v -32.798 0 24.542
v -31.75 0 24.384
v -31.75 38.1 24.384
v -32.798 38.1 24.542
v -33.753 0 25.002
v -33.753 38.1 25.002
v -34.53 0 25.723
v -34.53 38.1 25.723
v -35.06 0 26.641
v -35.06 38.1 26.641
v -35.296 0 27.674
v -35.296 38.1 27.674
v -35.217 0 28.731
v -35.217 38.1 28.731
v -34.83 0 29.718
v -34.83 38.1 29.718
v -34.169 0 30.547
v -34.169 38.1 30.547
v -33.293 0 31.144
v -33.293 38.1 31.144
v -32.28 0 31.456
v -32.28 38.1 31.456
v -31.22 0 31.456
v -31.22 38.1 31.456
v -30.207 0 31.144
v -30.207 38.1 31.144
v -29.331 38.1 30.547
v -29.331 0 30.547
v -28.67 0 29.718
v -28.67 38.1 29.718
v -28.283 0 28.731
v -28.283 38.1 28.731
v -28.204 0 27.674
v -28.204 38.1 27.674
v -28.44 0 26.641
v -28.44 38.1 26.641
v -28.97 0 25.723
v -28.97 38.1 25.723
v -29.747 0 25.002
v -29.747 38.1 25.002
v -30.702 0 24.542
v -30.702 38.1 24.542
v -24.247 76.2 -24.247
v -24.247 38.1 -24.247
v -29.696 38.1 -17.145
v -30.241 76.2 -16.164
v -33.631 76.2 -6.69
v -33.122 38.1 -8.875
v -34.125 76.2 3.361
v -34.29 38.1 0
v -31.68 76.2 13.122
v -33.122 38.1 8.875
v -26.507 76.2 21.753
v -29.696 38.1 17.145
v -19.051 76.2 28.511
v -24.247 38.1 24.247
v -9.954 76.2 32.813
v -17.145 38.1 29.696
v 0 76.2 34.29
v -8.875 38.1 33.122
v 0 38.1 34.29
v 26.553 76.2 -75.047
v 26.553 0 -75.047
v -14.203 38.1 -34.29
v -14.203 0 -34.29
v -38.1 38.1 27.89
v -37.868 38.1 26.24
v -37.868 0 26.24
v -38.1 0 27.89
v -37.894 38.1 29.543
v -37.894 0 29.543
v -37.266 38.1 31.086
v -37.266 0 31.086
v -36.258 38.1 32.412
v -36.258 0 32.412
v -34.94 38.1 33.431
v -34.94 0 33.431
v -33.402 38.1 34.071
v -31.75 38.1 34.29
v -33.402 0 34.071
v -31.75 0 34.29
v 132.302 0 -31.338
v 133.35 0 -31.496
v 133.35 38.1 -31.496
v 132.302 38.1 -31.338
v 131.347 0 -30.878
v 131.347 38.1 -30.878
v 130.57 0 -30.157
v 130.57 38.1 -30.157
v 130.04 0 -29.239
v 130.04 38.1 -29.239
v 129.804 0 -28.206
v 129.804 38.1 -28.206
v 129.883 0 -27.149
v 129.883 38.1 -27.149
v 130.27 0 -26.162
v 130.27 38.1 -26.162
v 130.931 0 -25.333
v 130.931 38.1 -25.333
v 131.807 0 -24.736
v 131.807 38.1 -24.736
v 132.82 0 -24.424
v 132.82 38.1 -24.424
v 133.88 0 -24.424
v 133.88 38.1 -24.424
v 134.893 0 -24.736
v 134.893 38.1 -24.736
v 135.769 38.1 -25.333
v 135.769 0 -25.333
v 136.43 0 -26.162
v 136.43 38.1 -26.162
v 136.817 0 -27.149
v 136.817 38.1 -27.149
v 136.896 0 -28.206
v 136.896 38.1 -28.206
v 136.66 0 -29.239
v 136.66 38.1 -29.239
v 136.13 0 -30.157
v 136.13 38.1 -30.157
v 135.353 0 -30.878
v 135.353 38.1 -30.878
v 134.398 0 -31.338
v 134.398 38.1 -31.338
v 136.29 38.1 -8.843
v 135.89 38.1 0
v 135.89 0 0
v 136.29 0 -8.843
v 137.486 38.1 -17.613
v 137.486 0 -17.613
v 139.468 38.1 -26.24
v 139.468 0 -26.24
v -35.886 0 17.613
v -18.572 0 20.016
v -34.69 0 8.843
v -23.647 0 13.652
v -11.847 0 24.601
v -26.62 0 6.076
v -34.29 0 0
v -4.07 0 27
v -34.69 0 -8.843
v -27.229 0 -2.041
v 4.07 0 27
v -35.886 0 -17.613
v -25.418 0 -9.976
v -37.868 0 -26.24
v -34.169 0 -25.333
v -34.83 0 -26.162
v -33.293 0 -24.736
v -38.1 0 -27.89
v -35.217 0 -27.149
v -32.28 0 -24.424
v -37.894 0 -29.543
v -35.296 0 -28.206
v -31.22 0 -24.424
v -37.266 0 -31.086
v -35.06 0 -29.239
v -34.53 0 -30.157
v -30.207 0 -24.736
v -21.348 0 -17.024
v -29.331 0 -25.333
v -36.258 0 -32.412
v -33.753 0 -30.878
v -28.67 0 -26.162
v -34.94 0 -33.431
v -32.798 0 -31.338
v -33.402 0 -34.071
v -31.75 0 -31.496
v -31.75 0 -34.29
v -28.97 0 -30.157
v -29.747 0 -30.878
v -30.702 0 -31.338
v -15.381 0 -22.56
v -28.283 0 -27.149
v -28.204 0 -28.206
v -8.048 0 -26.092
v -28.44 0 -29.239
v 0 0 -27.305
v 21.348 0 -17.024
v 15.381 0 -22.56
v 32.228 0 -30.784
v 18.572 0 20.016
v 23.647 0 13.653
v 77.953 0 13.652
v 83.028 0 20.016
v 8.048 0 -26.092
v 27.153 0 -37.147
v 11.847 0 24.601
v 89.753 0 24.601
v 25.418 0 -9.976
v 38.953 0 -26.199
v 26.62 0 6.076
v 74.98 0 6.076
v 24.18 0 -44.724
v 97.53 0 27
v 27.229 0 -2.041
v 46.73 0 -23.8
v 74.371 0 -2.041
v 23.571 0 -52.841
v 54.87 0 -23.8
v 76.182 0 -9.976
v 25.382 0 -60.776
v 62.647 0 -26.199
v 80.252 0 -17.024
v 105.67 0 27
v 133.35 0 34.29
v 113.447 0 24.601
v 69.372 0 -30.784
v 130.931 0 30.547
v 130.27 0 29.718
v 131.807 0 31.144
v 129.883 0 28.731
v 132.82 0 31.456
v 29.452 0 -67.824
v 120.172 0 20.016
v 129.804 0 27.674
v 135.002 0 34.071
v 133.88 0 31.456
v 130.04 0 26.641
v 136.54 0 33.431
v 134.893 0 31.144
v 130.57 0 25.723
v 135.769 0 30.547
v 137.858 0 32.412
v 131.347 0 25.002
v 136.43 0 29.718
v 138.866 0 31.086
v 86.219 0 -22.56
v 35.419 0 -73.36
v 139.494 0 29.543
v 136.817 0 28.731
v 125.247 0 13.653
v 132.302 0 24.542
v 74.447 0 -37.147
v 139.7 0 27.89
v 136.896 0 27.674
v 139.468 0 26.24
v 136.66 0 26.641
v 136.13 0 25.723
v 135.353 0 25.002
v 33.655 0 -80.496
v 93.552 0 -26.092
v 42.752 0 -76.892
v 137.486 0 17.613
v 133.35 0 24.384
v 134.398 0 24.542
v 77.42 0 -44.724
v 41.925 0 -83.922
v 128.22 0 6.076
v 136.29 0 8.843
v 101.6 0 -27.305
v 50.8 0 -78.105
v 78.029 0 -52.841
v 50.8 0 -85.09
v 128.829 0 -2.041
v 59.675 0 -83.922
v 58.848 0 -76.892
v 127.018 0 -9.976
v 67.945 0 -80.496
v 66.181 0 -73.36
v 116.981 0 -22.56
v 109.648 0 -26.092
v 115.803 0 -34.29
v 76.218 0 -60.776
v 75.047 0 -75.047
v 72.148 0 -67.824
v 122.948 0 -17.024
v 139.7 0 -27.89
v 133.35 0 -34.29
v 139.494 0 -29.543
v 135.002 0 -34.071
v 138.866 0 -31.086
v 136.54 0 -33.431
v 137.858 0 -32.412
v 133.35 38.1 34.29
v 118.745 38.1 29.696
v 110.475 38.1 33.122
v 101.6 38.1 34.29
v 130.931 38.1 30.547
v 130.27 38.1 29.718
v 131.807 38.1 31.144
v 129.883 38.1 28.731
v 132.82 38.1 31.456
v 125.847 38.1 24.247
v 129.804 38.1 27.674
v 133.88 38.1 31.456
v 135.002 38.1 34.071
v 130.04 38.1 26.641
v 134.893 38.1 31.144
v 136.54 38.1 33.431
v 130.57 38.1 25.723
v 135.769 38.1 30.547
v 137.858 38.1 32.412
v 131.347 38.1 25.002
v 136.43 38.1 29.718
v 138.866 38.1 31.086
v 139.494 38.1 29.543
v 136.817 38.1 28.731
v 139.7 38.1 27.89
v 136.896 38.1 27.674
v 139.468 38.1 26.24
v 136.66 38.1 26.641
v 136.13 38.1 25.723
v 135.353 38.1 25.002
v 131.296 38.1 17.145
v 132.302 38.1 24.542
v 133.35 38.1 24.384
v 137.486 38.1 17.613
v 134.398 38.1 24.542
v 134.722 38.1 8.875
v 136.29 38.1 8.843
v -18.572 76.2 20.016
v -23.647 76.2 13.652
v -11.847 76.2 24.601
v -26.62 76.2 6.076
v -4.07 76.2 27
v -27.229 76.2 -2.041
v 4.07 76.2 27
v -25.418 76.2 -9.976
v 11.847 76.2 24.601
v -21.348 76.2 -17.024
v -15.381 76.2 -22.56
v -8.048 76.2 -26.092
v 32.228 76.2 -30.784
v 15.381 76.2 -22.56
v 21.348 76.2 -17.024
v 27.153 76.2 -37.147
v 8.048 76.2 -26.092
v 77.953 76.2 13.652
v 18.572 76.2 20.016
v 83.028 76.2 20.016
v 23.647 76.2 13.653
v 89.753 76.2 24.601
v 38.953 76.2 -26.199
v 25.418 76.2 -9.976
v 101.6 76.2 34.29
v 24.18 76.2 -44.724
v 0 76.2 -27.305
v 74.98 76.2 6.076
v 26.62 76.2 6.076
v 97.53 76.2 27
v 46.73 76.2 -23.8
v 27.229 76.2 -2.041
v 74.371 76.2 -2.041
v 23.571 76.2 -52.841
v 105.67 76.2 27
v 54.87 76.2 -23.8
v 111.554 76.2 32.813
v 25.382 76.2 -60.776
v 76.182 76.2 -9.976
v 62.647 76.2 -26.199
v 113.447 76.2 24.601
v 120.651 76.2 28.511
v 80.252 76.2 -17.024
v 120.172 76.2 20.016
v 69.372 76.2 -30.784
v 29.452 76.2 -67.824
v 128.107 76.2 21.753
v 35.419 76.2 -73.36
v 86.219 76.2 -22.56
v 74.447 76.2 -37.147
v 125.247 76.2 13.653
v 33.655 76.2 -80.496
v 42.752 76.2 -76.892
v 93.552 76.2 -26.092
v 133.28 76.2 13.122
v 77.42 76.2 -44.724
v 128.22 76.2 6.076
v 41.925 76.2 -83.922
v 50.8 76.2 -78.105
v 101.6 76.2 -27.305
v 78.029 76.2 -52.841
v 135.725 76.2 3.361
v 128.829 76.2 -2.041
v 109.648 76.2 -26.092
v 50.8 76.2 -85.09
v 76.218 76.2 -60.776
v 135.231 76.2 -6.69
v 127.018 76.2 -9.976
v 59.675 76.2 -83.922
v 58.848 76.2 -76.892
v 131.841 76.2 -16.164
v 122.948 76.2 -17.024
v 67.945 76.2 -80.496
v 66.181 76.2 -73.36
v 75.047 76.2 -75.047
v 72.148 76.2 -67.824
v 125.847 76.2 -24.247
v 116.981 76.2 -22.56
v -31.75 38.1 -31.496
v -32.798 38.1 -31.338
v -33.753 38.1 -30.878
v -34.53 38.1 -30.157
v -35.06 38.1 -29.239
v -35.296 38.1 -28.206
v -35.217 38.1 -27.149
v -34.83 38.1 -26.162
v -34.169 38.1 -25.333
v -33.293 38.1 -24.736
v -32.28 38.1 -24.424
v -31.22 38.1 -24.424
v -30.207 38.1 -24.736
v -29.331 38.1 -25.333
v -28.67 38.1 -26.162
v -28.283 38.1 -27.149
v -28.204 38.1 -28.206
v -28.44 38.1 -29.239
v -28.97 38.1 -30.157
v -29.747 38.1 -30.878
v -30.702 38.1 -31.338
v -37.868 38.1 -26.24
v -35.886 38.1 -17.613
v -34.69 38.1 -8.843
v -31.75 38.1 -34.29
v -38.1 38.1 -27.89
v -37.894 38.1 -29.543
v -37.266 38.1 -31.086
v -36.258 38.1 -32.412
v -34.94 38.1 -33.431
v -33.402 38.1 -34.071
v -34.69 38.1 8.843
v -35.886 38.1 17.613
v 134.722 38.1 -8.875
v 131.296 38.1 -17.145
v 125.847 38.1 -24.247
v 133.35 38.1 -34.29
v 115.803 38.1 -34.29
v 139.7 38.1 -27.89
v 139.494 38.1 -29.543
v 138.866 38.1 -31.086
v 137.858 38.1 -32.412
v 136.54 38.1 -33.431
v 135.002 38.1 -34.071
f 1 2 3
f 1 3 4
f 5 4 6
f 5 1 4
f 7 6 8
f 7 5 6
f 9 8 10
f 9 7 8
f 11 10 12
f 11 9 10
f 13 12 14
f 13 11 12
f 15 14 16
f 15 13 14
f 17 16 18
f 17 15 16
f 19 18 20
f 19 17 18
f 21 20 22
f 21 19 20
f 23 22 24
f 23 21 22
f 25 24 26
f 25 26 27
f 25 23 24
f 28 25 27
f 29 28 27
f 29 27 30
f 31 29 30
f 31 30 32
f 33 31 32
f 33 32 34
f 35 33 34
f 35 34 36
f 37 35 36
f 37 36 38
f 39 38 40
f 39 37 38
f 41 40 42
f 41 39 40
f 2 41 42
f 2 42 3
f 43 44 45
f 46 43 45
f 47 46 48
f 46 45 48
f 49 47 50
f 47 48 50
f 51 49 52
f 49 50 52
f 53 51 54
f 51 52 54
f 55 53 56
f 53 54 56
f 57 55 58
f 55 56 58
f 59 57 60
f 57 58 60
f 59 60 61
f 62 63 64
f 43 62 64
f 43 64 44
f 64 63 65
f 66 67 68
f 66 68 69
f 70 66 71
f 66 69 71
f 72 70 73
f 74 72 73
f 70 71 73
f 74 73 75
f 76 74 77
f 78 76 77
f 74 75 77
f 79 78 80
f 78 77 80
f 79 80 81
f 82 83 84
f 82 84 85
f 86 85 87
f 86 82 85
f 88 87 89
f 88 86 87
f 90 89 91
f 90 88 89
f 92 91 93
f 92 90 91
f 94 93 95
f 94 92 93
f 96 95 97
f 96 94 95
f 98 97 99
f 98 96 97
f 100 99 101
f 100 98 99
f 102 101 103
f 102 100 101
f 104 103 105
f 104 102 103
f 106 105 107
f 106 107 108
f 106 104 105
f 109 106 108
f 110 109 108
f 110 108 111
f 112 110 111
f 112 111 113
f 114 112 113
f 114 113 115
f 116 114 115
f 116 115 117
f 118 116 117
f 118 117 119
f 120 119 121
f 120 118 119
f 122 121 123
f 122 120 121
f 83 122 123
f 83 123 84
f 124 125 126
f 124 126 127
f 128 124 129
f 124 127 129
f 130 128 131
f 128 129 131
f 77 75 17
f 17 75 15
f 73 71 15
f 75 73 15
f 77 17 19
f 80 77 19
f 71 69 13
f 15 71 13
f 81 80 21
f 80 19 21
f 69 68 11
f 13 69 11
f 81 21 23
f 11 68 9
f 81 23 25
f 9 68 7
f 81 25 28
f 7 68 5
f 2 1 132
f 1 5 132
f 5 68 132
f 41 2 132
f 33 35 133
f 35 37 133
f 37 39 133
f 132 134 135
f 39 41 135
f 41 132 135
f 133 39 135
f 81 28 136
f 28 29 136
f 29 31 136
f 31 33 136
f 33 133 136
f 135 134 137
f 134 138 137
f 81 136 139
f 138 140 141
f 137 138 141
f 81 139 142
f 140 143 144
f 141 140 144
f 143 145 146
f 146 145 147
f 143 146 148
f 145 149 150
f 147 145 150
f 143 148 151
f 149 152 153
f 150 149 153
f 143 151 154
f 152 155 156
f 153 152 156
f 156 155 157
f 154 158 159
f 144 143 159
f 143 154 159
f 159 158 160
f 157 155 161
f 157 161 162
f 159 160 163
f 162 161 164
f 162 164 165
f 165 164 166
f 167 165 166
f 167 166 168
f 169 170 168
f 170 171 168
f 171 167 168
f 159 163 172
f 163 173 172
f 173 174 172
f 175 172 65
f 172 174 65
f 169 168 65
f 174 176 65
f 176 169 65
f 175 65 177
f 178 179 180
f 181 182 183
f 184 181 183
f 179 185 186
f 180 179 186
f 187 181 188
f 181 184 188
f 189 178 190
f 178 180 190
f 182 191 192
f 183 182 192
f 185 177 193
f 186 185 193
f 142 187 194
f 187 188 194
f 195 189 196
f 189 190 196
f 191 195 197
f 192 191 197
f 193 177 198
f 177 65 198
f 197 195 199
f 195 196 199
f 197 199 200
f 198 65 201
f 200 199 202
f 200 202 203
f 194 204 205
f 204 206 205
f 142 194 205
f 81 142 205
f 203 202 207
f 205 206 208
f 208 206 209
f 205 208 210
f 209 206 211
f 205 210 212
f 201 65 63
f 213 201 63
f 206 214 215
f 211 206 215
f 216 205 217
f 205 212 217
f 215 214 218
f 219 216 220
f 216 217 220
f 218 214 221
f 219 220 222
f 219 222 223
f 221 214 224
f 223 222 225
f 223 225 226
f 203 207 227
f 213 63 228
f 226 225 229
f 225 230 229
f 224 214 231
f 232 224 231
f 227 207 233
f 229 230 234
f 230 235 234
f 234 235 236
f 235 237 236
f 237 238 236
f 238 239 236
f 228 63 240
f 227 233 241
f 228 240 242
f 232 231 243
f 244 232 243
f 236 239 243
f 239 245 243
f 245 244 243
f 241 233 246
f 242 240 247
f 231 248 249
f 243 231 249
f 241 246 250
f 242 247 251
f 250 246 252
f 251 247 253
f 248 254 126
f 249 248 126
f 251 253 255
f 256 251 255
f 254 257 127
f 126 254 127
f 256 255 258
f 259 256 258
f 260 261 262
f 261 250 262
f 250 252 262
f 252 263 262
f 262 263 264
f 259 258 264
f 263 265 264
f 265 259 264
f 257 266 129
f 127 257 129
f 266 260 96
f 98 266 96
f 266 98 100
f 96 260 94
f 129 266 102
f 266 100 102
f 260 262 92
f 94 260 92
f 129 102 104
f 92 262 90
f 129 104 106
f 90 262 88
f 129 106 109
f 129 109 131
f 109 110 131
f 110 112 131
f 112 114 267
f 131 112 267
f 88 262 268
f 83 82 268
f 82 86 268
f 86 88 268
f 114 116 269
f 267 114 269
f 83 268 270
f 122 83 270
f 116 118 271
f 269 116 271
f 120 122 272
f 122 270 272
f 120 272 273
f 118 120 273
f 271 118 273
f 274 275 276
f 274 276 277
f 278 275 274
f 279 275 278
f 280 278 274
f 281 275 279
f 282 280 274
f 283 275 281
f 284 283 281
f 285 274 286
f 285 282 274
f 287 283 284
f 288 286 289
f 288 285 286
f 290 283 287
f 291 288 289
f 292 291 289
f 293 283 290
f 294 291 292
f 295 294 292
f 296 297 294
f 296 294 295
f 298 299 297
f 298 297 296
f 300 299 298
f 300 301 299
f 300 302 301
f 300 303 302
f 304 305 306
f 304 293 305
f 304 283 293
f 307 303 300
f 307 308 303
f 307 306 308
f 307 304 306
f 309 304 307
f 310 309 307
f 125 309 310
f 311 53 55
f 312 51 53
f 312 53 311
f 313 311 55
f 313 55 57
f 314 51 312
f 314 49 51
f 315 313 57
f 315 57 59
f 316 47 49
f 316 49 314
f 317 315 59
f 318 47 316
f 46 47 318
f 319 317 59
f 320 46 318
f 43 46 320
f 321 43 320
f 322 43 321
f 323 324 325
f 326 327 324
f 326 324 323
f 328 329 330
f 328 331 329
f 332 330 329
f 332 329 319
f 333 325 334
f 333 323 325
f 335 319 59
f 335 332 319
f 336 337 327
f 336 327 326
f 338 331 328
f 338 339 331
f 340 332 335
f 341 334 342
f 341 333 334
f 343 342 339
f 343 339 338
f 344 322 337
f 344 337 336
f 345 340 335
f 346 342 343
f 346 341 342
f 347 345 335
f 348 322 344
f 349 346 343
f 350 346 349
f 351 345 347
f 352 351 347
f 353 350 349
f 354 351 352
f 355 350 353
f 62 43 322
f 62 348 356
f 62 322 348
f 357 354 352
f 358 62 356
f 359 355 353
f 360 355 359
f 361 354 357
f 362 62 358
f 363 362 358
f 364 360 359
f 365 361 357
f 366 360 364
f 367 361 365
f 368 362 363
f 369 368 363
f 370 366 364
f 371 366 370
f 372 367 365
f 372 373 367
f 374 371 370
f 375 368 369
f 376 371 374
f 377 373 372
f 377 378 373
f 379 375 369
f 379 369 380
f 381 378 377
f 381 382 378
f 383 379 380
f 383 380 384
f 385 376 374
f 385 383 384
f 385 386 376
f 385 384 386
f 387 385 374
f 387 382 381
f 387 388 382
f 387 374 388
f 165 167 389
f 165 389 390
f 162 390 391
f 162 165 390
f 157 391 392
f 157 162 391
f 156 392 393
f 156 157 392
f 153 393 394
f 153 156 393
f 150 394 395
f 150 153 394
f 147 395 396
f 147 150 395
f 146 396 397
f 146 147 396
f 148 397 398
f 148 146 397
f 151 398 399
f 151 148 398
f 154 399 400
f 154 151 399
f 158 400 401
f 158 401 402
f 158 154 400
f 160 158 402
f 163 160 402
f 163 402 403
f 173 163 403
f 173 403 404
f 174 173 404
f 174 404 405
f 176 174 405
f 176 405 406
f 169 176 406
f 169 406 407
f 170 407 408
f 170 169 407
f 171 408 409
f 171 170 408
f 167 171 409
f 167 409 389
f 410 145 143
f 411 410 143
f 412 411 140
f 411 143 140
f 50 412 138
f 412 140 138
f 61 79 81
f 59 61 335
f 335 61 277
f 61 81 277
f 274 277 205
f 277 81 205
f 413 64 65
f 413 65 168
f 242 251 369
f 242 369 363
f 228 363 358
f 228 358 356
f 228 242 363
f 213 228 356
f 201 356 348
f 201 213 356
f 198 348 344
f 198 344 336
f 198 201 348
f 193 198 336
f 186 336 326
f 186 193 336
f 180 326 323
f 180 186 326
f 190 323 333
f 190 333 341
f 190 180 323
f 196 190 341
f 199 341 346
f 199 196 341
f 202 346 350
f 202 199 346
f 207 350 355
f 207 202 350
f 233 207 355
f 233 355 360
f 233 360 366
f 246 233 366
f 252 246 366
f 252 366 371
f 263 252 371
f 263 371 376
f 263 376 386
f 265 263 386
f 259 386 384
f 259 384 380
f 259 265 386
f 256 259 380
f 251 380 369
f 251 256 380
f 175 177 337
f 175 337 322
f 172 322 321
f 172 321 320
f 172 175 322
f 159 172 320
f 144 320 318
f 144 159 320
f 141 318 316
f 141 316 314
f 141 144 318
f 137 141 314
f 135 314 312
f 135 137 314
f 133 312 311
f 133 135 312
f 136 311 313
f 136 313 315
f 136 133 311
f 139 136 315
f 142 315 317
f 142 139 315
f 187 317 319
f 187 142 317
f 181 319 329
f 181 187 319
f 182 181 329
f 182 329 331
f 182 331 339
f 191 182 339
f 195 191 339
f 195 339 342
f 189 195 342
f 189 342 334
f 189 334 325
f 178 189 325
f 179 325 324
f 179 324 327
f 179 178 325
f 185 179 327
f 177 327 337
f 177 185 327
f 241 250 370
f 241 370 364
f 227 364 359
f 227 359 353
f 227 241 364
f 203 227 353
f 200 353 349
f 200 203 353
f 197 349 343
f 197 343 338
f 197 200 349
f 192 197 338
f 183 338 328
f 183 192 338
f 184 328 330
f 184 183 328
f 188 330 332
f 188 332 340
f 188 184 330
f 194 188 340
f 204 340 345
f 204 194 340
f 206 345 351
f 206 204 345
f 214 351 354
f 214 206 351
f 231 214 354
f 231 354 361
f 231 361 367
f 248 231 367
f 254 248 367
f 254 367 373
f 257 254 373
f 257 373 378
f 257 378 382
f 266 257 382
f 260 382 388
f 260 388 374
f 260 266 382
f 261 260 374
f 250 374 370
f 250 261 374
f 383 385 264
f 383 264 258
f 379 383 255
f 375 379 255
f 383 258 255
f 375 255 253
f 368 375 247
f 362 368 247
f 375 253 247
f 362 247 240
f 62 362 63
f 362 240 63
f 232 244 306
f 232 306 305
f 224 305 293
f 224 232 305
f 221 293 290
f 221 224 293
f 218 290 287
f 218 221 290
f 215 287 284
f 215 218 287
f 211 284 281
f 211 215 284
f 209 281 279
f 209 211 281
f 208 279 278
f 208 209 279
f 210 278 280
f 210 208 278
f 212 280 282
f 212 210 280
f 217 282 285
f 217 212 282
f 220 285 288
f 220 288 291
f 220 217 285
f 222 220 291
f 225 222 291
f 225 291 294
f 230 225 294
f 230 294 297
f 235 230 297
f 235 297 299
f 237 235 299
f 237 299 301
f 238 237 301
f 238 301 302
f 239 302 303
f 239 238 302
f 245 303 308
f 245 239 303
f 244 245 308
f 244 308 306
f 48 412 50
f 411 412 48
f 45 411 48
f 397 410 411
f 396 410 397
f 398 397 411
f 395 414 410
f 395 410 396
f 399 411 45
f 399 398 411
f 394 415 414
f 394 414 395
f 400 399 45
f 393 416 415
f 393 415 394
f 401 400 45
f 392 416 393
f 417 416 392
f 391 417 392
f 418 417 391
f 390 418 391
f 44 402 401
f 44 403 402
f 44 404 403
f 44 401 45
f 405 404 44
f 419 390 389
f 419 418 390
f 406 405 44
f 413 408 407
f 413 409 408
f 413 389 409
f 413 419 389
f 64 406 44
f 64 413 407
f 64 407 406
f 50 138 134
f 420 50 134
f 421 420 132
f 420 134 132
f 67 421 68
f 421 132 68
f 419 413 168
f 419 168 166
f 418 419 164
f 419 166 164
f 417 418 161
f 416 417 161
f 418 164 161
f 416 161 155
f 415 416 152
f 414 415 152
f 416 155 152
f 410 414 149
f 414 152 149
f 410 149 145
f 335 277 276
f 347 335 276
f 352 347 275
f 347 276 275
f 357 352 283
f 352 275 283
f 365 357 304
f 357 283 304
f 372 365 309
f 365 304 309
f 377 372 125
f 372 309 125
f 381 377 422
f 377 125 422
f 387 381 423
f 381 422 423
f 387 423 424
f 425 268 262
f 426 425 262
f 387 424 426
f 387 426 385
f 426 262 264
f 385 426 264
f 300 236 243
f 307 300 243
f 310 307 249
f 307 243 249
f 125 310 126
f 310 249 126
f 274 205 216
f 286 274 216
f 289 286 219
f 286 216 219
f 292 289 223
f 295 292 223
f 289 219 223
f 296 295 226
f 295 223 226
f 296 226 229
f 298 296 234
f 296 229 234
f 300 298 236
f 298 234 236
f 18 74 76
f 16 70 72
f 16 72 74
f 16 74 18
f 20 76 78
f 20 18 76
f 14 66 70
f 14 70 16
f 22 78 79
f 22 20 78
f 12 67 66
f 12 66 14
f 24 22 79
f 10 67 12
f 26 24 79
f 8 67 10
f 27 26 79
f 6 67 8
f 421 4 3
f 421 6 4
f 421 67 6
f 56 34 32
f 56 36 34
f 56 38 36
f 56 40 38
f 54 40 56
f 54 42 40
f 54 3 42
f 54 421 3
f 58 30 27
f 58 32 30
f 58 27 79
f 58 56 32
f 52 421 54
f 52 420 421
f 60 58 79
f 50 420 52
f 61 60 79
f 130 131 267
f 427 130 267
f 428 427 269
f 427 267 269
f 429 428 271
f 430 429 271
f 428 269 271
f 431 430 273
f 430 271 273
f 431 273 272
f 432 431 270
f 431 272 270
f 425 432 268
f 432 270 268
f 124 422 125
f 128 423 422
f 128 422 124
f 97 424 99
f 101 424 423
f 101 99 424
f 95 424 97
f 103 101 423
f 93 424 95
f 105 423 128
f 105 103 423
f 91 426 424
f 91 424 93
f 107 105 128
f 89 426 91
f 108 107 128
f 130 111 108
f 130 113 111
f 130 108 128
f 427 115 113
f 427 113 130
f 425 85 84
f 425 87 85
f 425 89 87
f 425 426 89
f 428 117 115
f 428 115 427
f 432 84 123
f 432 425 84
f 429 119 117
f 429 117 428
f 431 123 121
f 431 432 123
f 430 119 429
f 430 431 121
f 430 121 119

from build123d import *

# Parameters (mm, degrees)
SKETCH1_R           = 27.305
BOSS_EXTRUDE1_DEPTH = 76.2
SKETCH1_3_R         = 3.556
BOSS_EXTRUDE2_DEPTH = 38.1


with BuildPart() as part:
    # Sketch1 → Boss-Extrude1 (new body)
    with BuildSketch(Plane(origin=(0, 0, 0), x_dir=(1, 0, 0), z_dir=(0, 1, 0))):
        with BuildLine():
            Line((26.553308473, 75.046691527), (-24.246691527, 24.246691527))
            ThreePointArc((-24.246691527, 24.246691527), (-31.67982917, -13.122214896), (0, -34.29))
            Line((0, -34.29), (101.6, -34.29))
            ThreePointArc((101.6, -34.29), (133.27982917, -13.122214896), (125.846691527, 24.246691527))
            Line((125.846691527, 24.246691527), (75.046691527, 75.046691527))
            ThreePointArc((75.046691527, 75.046691527), (50.8, 85.09), (26.553308473, 75.046691527))
        make_face()
        with Locations(Location((101.6, 0, 0), (0, 0, 90))):
            Circle(SKETCH1_R, mode=Mode.SUBTRACT)
        with Locations(Location((0, 0, 0), (0, 0, 90))):
            Circle(SKETCH1_R, mode=Mode.SUBTRACT)
        with Locations(Location((50.8, 50.8, 0), (0, 0, 90))):
            Circle(SKETCH1_R, mode=Mode.SUBTRACT)
    extrude(amount=BOSS_EXTRUDE1_DEPTH)

    # Sketch1<3> → Boss-Extrude2 (add)
    # profile 1 of 4: a face of its own
    with BuildSketch(Plane(origin=(0, 0, 0), x_dir=(1, 0, 0), z_dir=(0, 1, 0))):
        with BuildLine():
            Line((-24.246691527, 24.246691527), (-14.203383054, 34.29))
            Line((-14.203383054, 34.29), (-31.75, 34.29))
            ThreePointArc((-31.75, 34.29), (-36.805629933, 31.782278749), (-37.868154158, 26.23979716))
            ThreePointArc((-37.868154158, 26.23979716), (-35.188658815, 13.241319251), (-34.29, -3e-09))
            ThreePointArc((-34.29, -3e-09), (-31.67982917, 13.122214895), (-24.246691527, 24.246691527))
        make_face()
        with Locations(Location((-31.75, 27.94, 0), (0, 0, 90))):
            Circle(SKETCH1_3_R, mode=Mode.SUBTRACT)
    # profile 2 of 4: a face of its own
    with BuildSketch(Plane(origin=(0, 0, 0), x_dir=(1, 0, 0), z_dir=(0, 1, 0))):
        with BuildLine():
            ThreePointArc((0, -34.29), (-24.246691526, -24.246691528), (-34.29, -3e-09))
            ThreePointArc((-34.29, -3e-09), (-35.188658815, -13.241319254), (-37.868154158, -26.23979716))
            ThreePointArc((-37.868154158, -26.23979716), (-36.805629933, -31.782278749), (-31.75, -34.29))
            Line((-31.75, -34.29), (0, -34.29))
        make_face()
        with Locations(Location((-31.75, -27.94, 0), (0, 0, 90))):
            Circle(SKETCH1_3_R, mode=Mode.SUBTRACT)
    # profile 3 of 4: a face of its own
    with BuildSketch(Plane(origin=(0, 0, 0), x_dir=(1, 0, 0), z_dir=(0, 1, 0))):
        with BuildLine():
            Line((133.35, 34.29), (115.803383054, 34.29))
            Line((115.803383054, 34.29), (125.846691527, 24.246691527))
            ThreePointArc((125.846691527, 24.246691527), (133.279829151, 13.122214941), (135.89, 9.8e-08))
            ThreePointArc((135.89, 9.8e-08), (136.788658821, 13.241319301), (139.468154158, 26.23979716))
            ThreePointArc((139.468154158, 26.23979716), (138.405629933, 31.782278749), (133.35, 34.29))
        make_face()
        with Locations(Location((133.35, 27.94, 0), (0, 0, 90))):
            Circle(SKETCH1_3_R, mode=Mode.SUBTRACT)
    # profile 4 of 4: a face of its own
    with BuildSketch(Plane(origin=(0, 0, 0), x_dir=(1, 0, 0), z_dir=(0, 1, 0))):
        with BuildLine():
            ThreePointArc((135.89, 9.8e-08), (125.846691562, -24.246691492), (101.6, -34.29))
            Line((101.6, -34.29), (133.35, -34.29))
            ThreePointArc((133.35, -34.29), (138.405629933, -31.782278749), (139.468154158, -26.23979716))
            ThreePointArc((139.468154158, -26.23979716), (136.788658808, -13.241319204), (135.89, 9.8e-08))
        make_face()
        with Locations(Location((133.35, -27.94, 0), (0, 0, 90))):
            Circle(SKETCH1_3_R, mode=Mode.SUBTRACT)
    extrude(amount=BOSS_EXTRUDE2_DEPTH)


solid = part.part
